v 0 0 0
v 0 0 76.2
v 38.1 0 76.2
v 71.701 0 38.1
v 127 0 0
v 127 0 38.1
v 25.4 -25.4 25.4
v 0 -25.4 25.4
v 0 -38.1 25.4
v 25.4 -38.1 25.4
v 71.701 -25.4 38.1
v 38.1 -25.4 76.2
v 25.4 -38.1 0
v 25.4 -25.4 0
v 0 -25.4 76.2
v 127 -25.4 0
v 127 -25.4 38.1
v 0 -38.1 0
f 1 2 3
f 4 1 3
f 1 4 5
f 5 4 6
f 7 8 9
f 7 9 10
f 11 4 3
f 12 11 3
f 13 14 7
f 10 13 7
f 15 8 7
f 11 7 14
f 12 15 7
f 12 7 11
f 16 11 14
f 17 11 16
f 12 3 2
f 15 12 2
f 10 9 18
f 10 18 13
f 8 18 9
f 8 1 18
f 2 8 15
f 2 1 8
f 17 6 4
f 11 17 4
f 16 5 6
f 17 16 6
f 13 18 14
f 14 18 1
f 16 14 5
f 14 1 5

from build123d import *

# Parameters (mm, degrees)
F1_DEPTH = 25.4
F2_W     = 25.4
F2_H     = 25.4
F3_DEPTH = 12.7


with BuildPart() as f1:
    # F0 (on Front) → F1 (new body)
    with BuildSketch(Plane.XZ):
        Polygon((0, 76.2), (0, 38.1), (71.701042, 38.1), (38.1, 76.2), align=None)
        Polygon((0, 25.4), (0, 0), (127, 0), (127, 38.1), (71.701042, 38.1), (0, 38.1), align=None)
    extrude(amount=F1_DEPTH)

    # F2 (on face) → F3 (join)
    with BuildSketch(Plane.XZ.offset(25.4)):
        with Locations((12.7, 12.7)):
            Rectangle(F2_W, F2_H)
    extrude(amount=F3_DEPTH)


solid = f1.part
